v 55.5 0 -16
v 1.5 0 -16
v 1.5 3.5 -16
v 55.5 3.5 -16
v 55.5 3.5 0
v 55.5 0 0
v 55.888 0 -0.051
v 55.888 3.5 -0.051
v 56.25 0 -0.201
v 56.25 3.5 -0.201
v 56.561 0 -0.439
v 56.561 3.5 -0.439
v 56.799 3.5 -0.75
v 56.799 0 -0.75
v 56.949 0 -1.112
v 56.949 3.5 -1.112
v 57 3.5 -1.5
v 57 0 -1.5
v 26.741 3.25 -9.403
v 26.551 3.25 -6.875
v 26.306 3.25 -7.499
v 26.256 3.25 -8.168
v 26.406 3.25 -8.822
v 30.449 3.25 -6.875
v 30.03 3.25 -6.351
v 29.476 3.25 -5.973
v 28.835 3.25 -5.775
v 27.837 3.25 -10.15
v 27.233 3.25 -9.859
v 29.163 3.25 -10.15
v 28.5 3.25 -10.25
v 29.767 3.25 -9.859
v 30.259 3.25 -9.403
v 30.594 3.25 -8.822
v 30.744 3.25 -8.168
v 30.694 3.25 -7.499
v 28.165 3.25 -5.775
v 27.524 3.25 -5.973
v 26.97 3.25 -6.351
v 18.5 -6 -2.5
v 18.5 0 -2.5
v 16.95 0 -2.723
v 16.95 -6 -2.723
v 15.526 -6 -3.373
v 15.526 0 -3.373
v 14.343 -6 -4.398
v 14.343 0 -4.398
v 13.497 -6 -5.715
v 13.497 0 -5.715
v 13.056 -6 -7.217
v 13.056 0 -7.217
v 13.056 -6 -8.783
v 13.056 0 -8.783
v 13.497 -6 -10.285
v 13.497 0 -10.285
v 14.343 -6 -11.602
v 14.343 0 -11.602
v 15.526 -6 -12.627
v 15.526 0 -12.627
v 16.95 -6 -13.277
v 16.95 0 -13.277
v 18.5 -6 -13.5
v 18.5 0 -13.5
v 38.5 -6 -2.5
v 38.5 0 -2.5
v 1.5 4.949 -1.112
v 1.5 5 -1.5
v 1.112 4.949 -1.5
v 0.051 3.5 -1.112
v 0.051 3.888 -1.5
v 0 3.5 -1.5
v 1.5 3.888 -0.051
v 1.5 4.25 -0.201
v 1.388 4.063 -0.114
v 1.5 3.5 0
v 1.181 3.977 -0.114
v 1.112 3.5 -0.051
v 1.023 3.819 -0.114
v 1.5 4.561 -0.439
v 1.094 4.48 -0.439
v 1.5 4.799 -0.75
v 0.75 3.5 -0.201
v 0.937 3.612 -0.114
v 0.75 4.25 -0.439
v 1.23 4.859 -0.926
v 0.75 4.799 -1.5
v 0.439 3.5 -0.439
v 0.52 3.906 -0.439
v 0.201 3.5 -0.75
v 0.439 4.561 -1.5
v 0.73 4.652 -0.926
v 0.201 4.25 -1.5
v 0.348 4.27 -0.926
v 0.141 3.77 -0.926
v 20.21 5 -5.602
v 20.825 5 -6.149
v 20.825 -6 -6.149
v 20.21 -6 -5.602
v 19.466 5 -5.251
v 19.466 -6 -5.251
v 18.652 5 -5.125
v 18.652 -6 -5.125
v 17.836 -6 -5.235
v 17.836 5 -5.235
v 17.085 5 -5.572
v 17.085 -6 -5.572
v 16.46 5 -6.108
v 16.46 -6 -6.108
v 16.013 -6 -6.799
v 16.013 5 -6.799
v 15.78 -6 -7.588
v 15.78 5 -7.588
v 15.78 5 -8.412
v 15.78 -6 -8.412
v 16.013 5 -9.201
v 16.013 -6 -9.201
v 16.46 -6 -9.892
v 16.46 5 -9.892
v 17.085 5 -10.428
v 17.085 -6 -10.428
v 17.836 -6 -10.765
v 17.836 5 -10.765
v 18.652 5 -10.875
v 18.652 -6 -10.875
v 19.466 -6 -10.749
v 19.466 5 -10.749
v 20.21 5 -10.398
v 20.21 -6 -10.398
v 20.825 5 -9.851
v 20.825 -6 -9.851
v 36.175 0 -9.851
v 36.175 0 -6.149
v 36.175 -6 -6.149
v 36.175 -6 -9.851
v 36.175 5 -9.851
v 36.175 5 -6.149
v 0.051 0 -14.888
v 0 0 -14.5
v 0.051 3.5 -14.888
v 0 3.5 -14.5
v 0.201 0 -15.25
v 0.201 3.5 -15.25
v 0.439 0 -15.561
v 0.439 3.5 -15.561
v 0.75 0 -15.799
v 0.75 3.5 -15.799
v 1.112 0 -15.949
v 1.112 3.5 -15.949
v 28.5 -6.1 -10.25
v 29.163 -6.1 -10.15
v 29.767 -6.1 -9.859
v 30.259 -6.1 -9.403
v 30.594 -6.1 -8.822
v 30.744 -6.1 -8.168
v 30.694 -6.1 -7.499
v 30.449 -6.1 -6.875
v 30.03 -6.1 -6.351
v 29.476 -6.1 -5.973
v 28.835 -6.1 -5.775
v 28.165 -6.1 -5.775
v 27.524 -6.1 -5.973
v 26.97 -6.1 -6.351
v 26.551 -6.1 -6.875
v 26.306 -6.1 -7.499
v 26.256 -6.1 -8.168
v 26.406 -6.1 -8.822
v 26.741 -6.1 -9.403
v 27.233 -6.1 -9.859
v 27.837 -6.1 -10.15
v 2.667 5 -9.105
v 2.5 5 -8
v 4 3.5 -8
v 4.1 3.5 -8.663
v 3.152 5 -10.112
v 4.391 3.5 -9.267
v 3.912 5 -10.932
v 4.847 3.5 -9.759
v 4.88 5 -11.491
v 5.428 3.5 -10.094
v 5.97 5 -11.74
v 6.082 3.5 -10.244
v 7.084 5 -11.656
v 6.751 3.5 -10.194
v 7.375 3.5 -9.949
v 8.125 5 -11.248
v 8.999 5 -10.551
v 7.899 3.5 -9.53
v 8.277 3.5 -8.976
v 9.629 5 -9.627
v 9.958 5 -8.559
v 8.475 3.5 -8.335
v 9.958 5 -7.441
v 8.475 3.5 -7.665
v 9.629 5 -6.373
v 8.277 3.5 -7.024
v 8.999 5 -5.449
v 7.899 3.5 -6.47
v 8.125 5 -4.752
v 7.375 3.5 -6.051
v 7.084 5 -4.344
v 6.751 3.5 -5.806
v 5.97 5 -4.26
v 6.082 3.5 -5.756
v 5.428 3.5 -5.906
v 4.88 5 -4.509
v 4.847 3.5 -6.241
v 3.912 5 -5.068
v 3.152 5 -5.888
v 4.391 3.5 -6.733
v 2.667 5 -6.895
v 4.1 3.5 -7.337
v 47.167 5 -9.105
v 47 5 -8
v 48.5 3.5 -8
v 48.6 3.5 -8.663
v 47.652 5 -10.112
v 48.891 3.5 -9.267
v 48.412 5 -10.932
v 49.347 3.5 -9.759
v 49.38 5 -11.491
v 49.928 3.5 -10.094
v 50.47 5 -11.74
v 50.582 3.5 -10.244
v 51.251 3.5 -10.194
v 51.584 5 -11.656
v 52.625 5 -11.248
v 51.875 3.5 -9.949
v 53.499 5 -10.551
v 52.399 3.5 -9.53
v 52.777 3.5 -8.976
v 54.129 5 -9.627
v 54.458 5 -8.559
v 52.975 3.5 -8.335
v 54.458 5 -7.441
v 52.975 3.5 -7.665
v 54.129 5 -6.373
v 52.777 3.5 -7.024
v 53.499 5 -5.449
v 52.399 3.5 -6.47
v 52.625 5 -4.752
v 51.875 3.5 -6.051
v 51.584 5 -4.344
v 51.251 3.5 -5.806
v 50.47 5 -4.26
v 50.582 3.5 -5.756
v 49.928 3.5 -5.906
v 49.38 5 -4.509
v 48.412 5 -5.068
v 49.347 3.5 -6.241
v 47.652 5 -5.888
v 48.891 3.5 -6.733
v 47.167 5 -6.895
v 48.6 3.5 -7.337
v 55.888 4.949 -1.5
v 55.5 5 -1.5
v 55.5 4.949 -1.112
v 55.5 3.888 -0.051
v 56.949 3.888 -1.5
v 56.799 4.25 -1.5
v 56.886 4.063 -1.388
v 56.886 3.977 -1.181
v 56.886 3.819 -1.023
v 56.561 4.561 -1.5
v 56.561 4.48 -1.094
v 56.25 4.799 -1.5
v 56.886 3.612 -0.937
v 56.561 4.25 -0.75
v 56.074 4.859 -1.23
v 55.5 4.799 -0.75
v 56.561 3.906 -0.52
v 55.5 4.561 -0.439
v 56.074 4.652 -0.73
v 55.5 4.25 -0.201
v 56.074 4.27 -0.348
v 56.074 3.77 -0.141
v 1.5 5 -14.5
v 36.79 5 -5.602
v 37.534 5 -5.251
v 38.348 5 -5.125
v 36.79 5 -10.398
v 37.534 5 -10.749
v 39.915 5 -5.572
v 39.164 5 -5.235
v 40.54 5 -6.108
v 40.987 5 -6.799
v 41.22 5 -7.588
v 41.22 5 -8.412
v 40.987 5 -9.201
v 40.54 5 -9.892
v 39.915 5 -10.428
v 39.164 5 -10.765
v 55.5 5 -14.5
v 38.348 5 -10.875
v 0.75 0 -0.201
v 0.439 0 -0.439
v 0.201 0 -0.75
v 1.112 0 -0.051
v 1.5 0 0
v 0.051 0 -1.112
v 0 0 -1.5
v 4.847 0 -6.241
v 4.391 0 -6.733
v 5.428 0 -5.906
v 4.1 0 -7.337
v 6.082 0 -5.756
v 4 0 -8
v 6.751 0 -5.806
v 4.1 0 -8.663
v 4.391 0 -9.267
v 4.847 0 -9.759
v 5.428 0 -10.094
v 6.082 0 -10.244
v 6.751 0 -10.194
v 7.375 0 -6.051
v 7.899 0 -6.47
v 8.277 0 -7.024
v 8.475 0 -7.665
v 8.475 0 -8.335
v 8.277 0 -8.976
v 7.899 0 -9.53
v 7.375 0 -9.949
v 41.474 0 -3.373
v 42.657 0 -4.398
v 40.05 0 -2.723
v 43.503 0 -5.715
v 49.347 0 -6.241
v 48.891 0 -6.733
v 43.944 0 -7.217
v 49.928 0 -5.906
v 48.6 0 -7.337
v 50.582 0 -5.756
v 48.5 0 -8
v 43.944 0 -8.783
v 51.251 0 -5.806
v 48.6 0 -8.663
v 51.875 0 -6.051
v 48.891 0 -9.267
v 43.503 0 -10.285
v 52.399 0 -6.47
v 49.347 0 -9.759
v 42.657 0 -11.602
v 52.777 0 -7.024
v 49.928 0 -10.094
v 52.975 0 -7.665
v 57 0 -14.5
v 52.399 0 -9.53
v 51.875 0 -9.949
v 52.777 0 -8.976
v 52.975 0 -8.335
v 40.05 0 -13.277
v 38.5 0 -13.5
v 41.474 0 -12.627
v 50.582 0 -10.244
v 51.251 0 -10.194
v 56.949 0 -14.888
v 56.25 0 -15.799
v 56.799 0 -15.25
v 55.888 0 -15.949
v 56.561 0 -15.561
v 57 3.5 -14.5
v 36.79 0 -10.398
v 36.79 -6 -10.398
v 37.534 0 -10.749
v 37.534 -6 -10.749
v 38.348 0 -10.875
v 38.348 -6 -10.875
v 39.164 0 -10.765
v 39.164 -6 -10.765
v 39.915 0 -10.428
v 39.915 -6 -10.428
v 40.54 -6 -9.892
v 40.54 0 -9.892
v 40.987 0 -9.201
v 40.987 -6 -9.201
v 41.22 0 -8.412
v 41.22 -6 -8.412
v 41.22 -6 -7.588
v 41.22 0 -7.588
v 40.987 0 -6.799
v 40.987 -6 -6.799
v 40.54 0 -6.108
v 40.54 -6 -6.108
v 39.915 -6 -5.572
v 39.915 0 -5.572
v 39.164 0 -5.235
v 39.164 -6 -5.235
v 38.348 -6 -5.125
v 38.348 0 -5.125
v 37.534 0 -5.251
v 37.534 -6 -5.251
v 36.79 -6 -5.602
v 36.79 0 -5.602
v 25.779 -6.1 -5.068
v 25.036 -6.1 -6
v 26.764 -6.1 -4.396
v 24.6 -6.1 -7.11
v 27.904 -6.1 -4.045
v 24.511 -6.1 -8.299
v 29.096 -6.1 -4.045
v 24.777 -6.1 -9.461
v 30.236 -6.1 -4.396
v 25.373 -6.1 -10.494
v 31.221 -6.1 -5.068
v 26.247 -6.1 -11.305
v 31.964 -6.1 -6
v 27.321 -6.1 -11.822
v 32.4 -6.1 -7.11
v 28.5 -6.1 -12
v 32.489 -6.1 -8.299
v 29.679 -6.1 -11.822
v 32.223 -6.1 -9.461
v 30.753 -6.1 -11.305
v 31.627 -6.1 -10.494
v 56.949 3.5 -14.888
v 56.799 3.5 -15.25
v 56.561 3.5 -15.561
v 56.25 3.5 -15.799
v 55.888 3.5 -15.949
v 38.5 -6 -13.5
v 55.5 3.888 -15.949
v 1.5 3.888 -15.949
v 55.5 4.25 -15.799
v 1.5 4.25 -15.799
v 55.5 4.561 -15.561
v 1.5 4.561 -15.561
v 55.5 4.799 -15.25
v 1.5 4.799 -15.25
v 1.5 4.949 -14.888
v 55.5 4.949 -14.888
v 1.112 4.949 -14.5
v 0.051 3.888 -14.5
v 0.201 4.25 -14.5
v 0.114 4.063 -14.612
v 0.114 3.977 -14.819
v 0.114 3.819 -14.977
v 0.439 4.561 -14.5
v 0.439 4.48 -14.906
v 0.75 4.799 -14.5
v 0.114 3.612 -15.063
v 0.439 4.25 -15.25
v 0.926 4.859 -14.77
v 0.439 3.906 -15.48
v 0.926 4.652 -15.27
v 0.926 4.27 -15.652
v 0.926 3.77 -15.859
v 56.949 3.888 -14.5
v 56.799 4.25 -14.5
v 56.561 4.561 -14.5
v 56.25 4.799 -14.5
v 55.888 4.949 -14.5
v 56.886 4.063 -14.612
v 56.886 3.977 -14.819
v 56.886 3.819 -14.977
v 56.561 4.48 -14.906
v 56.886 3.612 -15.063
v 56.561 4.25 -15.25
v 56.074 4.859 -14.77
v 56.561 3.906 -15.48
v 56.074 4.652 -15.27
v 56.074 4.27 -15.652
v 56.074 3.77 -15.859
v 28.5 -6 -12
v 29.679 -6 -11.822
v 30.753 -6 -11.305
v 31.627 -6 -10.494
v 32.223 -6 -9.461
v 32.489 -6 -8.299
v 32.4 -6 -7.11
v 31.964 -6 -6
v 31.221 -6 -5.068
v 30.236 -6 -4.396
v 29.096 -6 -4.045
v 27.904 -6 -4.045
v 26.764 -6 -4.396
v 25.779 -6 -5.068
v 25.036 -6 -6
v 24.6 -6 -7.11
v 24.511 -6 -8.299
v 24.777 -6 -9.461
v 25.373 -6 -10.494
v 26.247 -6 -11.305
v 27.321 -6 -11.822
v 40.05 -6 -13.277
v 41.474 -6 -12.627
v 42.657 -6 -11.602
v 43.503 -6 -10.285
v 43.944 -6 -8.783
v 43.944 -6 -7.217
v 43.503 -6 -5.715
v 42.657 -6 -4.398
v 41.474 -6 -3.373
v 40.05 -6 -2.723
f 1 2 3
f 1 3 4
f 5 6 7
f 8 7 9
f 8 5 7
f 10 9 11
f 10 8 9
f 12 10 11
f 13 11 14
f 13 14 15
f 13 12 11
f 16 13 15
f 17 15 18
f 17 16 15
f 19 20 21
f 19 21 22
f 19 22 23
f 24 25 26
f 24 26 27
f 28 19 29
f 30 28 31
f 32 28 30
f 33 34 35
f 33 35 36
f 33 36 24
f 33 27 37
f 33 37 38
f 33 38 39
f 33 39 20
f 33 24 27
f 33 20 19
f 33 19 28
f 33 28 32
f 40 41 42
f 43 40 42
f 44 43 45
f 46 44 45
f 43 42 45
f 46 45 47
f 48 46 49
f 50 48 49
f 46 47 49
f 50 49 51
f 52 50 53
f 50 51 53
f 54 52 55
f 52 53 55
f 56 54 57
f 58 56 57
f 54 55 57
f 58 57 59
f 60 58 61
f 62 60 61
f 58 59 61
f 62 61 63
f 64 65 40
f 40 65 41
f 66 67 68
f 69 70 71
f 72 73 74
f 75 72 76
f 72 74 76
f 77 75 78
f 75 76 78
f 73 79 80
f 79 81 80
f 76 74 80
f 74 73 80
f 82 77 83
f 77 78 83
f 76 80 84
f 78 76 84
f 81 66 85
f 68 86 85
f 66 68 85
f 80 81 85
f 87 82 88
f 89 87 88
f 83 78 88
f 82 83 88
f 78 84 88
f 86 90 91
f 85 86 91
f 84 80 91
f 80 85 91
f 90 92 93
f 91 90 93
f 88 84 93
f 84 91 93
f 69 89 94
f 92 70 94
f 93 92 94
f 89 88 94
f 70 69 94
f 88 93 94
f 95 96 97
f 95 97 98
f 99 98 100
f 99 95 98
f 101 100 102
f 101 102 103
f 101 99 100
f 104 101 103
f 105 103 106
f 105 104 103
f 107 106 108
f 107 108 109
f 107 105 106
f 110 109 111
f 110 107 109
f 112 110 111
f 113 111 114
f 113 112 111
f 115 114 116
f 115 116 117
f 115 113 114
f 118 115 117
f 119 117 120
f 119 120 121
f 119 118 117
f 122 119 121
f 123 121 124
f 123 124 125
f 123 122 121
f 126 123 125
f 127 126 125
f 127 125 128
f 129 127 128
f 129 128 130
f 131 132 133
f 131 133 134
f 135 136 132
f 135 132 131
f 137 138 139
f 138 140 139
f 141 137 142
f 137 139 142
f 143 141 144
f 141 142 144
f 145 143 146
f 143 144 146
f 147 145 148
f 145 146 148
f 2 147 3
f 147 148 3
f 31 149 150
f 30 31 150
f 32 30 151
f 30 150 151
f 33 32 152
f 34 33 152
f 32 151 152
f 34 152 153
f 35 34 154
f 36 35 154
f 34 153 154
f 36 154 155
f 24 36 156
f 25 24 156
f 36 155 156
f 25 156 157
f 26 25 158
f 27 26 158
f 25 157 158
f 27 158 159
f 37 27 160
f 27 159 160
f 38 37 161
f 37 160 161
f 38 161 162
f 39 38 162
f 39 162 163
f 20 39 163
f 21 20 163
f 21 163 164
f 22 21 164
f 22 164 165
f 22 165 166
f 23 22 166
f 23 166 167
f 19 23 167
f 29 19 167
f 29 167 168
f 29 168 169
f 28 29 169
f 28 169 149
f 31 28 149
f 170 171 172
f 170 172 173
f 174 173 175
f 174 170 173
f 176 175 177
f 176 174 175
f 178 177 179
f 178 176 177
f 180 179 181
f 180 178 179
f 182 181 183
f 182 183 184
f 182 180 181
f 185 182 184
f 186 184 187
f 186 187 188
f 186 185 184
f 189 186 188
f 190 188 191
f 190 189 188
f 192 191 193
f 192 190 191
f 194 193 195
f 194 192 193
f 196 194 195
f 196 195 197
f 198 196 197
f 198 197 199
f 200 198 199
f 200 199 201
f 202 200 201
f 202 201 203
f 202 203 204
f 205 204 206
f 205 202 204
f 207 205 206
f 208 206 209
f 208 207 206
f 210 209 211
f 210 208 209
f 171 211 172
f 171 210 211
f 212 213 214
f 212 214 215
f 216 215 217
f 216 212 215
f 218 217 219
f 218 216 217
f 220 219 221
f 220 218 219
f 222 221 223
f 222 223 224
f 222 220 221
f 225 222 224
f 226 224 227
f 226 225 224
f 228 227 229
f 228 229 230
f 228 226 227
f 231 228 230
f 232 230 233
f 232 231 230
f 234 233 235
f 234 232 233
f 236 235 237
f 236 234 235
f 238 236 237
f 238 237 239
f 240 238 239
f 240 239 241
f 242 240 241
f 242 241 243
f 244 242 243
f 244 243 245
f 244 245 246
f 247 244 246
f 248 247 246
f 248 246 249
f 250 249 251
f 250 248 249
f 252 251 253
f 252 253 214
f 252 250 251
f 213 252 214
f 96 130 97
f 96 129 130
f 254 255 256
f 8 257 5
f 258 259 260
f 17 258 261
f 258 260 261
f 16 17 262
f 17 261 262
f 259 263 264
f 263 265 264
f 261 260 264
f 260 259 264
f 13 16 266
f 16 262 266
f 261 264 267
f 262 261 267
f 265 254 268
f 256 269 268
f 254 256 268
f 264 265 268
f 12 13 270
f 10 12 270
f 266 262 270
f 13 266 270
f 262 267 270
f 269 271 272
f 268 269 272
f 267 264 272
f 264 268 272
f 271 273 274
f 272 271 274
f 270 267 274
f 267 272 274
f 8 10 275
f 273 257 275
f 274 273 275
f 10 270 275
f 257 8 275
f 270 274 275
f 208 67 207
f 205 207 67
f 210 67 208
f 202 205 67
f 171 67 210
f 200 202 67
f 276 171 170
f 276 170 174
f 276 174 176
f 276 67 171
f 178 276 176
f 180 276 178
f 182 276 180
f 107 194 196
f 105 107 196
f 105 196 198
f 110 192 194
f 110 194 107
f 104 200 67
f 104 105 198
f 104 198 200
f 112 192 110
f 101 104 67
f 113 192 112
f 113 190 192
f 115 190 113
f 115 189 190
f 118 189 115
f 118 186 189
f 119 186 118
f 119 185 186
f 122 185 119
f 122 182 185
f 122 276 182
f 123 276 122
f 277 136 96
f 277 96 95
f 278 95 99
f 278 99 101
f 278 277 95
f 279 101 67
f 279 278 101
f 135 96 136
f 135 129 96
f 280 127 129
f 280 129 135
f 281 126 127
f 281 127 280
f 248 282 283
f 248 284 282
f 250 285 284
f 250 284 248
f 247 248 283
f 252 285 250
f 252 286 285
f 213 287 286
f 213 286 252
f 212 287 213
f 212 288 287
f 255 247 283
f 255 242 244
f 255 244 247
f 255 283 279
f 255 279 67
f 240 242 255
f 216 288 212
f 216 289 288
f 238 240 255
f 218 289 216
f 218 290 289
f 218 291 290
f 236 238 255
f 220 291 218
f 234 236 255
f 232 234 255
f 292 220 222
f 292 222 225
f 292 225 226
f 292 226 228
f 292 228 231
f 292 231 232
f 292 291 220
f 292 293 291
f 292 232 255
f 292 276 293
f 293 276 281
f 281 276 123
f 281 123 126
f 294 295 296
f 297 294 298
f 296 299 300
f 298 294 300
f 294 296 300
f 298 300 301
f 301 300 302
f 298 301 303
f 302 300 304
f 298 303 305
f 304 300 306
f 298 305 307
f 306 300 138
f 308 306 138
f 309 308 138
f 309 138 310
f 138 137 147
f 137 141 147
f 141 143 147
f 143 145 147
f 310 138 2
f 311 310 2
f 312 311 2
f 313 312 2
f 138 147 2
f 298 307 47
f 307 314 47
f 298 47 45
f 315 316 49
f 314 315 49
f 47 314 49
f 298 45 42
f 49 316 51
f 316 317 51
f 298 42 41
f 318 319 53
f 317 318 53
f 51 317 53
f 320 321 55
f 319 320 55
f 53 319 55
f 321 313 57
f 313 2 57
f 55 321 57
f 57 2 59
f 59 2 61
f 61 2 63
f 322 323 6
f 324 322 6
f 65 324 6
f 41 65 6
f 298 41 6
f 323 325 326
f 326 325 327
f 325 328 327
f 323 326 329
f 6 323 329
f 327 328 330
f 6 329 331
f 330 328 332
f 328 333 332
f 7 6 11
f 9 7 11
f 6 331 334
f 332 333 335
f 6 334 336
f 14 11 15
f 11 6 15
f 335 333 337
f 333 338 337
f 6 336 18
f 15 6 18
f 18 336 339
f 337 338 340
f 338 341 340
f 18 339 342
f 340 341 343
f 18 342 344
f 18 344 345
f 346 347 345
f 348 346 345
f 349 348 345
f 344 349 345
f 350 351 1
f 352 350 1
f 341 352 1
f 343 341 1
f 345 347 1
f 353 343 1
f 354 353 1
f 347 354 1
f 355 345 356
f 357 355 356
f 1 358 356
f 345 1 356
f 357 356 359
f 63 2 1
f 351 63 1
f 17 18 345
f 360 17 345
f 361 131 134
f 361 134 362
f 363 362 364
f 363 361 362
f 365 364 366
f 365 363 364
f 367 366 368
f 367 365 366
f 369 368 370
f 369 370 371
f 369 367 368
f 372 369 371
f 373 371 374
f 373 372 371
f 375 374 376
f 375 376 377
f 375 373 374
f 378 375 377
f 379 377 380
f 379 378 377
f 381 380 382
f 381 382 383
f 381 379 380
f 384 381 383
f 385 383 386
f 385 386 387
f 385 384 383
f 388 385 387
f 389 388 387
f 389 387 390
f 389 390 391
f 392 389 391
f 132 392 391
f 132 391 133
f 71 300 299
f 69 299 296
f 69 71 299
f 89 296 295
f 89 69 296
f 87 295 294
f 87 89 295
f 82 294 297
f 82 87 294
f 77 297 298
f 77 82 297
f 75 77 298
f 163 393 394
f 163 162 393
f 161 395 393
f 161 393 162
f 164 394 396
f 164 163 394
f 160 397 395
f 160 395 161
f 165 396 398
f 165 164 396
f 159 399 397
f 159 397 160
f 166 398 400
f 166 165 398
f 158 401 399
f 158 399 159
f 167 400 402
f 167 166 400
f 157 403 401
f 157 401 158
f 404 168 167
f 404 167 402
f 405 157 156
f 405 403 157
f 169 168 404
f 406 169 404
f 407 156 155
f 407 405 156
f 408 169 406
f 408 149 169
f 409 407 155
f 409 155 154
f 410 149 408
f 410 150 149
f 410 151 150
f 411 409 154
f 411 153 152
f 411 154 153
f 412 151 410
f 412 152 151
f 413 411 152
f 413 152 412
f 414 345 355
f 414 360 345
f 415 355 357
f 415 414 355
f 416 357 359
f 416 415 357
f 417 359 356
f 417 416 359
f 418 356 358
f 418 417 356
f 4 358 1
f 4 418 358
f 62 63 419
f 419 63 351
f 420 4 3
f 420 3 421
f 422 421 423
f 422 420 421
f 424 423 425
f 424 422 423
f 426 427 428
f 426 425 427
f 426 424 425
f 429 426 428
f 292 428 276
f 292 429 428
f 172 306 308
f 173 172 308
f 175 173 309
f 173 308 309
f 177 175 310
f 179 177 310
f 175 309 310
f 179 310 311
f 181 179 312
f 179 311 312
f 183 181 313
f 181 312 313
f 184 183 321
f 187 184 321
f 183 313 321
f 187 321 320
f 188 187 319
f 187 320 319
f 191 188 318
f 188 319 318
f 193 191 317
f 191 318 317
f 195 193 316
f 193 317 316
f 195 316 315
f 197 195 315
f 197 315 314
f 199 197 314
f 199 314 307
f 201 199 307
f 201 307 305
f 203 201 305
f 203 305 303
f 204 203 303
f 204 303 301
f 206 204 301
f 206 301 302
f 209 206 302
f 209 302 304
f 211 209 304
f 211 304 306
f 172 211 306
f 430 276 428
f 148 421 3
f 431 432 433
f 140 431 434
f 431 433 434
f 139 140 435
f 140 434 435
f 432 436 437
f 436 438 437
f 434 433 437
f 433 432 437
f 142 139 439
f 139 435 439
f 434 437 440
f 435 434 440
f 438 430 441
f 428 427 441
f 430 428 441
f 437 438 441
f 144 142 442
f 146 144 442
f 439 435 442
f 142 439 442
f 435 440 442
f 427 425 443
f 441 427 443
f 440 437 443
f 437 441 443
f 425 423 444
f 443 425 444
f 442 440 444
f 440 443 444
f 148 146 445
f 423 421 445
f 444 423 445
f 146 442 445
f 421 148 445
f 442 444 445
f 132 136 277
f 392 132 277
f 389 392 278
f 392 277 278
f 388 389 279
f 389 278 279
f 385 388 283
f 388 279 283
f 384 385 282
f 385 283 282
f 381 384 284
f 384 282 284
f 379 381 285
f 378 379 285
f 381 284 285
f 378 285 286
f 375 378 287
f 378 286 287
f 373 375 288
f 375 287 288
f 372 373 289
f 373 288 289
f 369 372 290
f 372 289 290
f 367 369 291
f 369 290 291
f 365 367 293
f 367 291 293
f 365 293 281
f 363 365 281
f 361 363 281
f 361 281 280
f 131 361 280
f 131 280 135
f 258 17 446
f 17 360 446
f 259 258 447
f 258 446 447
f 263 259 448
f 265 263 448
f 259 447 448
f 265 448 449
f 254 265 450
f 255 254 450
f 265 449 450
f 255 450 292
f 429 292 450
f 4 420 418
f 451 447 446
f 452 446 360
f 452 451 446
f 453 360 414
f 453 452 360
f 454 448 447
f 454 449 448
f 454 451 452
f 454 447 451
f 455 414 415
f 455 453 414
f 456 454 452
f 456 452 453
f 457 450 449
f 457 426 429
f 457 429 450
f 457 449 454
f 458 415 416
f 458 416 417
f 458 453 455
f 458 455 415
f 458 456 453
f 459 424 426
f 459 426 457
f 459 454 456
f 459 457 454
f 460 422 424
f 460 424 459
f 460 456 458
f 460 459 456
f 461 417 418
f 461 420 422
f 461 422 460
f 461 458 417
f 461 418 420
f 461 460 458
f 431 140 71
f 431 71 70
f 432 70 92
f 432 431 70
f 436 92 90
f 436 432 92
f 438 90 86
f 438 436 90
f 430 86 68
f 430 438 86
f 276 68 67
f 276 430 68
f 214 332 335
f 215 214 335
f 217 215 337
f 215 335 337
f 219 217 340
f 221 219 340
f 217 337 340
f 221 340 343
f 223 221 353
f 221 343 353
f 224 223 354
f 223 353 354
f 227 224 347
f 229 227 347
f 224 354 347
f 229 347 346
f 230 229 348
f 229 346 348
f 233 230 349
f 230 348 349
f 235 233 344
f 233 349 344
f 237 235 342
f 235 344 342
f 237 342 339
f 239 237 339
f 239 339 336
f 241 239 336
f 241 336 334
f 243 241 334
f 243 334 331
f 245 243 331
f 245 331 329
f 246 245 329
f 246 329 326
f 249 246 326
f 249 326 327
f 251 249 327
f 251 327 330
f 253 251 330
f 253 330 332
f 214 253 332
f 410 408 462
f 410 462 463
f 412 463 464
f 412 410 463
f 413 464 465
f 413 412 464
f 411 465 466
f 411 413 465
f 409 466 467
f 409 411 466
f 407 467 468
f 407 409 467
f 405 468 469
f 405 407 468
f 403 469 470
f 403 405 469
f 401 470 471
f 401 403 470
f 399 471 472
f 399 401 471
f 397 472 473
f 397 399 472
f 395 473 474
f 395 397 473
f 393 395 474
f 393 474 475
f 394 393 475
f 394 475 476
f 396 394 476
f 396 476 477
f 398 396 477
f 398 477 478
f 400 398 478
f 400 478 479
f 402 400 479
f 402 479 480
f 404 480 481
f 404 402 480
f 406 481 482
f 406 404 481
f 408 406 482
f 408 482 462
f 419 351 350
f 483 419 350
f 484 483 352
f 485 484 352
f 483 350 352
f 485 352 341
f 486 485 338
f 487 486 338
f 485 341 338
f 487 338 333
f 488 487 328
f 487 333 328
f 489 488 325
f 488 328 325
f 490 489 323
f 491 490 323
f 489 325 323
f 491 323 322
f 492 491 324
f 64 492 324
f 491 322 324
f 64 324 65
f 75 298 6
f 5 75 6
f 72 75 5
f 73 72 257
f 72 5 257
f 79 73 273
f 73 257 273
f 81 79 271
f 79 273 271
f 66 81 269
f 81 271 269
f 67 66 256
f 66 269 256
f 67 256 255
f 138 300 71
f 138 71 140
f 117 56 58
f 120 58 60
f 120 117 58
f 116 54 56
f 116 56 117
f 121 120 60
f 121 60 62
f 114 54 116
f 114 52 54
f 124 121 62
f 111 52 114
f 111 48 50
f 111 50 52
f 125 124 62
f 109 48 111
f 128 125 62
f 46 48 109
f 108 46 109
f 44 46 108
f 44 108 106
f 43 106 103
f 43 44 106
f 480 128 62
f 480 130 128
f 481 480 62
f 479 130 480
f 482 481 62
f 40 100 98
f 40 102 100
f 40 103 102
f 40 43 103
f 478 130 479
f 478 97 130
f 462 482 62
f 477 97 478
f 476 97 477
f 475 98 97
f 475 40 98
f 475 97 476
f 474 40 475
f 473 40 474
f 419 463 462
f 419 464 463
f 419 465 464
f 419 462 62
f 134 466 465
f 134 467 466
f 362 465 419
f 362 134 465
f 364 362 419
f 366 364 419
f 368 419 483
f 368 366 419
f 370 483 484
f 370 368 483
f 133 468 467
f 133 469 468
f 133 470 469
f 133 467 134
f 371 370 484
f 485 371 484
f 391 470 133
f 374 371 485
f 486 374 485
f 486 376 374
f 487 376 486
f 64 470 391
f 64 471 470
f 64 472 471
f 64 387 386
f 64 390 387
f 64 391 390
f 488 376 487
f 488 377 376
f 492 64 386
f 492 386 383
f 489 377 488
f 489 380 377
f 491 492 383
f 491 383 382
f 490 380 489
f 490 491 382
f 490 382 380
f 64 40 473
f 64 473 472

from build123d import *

# Parameters (mm, degrees)
SKETCH_1_W          = 57
SKETCH_1_H          = 16
EXTRUDE_1_DEPTH     = 5
FILLET_1_R          = 1.5
CUT_EXTRUDE_1_DEPTH = 15
HOLE_WIZARD_M41_D   = 4.5
CHAMFER_1_SIZE      = 1.5
EXTRUDE_2_DEPTH     = 6
SKETCH_9_R          = 2.25
CUT_EXTRUDE_2_DEPTH = 9.25
EXTRUDE_START       = 0.1
SKETCH_10_R         = 4
SKETCH_10_R_2       = 2.25
EXTRUDE_3_DEPTH     = 0.1


with BuildPart() as part:
    # Эскиз1 → Бобышка-Вытянуть1 (new body)
    with BuildSketch(Plane(origin=(0, 0, 0), x_dir=(1, 0, 0), z_dir=(0, 1, 0))):
        with Locations((28.5, 8)):
            Rectangle(SKETCH_1_W, SKETCH_1_H)
    extrude(amount=EXTRUDE_1_DEPTH)

    # Скругление1
    fillet_1_edges = [part.edges().sort_by_distance(p)[0] for p in [
        (28.5, 5, -16),
        (0, 5, -8),
        (28.5, 5, 0),
        (57, 5, -8),
        (0, 2.5, 0),
        (0, 2.5, -16),
        (57, 2.5, -16),
        (57, 2.5, 0),
    ]]
    fillet(fillet_1_edges, radius=FILLET_1_R)

    # Эскиз2 → Вырез-Вытянуть1 (cut)
    with BuildSketch(Plane(origin=(0, 5, 0), x_dir=(1, 0, 0), z_dir=(0, 1, 0))):
        with BuildLine():
            Line((36.175, 9.850844402), (36.175, 6.149155598))
            ThreePointArc((36.175, 6.149155598), (41.25, 8), (36.175, 9.850844402))
        make_face()
        with BuildLine():
            Line((20.825, 9.850844402), (20.825, 6.149155598))
            ThreePointArc((20.825, 6.149155598), (15.75, 8), (20.825, 9.850844402))
        make_face()
    extrude(amount=-CUT_EXTRUDE_1_DEPTH, mode=Mode.SUBTRACT)

    # Отверстие с зазором M41 (through all)
    with Locations(Plane(origin=(0, 5, 0), x_dir=(1, 0, 0), z_dir=(0, 1, 0))):
        with Locations((6.25, 8), (50.75, 8)):
            Hole(HOLE_WIZARD_M41_D / 2)

    # Фаска1
    chamfer_1_edges = [part.edges().sort_by_distance(p)[0] for p in [
        (53, 5, -8),
        (8.5, 5, -8),
    ]]
    chamfer(chamfer_1_edges, length=CHAMFER_1_SIZE)

    # Эскиз8 → Бобышка-Вытянуть2 (add)
    with BuildSketch(Plane.XZ):
        with BuildLine():
            Line((38.5, -2.5), (18.5, -2.5))
            ThreePointArc((18.5, -2.5), (13, -8), (18.5, -13.5))
            Line((18.5, -13.5), (38.5, -13.5))
            ThreePointArc((38.5, -13.5), (44, -8), (38.5, -2.5))
        make_face()
        with BuildLine():
            Line((36.175, -6.149155598), (36.175, -9.850844402))
            ThreePointArc((36.175, -9.850844402), (41.25, -8), (36.175, -6.149155598))
        make_face(mode=Mode.SUBTRACT)
        with BuildLine():
            Line((20.825, -9.850844402), (20.825, -6.149155598))
            ThreePointArc((20.825, -6.149155598), (15.75, -8), (20.825, -9.850844402))
        make_face(mode=Mode.SUBTRACT)
    extrude(amount=EXTRUDE_2_DEPTH)

    # Эскиз9 → Вырез-Вытянуть2 (cut)
    with BuildSketch(Plane.XZ.offset(6)):
        with Locations(Location((28.5, -8, 0), (0, 0, 270))):
            Circle(SKETCH_9_R)
    extrude(amount=-CUT_EXTRUDE_2_DEPTH, mode=Mode.SUBTRACT)

    # Эскиз10 → Бобышка-Вытянуть3 (add)
    with BuildSketch(Plane.XZ.offset(6).offset(EXTRUDE_START)):
        with Locations(Location((28.5, -8, 0), (0, 0, 270))):
            Circle(SKETCH_10_R)
        with Locations(Location((28.5, -8, 0), (0, 0, 270))):
            Circle(SKETCH_10_R_2, mode=Mode.SUBTRACT)
    extrude(amount=-EXTRUDE_3_DEPTH)


solid = part.part
